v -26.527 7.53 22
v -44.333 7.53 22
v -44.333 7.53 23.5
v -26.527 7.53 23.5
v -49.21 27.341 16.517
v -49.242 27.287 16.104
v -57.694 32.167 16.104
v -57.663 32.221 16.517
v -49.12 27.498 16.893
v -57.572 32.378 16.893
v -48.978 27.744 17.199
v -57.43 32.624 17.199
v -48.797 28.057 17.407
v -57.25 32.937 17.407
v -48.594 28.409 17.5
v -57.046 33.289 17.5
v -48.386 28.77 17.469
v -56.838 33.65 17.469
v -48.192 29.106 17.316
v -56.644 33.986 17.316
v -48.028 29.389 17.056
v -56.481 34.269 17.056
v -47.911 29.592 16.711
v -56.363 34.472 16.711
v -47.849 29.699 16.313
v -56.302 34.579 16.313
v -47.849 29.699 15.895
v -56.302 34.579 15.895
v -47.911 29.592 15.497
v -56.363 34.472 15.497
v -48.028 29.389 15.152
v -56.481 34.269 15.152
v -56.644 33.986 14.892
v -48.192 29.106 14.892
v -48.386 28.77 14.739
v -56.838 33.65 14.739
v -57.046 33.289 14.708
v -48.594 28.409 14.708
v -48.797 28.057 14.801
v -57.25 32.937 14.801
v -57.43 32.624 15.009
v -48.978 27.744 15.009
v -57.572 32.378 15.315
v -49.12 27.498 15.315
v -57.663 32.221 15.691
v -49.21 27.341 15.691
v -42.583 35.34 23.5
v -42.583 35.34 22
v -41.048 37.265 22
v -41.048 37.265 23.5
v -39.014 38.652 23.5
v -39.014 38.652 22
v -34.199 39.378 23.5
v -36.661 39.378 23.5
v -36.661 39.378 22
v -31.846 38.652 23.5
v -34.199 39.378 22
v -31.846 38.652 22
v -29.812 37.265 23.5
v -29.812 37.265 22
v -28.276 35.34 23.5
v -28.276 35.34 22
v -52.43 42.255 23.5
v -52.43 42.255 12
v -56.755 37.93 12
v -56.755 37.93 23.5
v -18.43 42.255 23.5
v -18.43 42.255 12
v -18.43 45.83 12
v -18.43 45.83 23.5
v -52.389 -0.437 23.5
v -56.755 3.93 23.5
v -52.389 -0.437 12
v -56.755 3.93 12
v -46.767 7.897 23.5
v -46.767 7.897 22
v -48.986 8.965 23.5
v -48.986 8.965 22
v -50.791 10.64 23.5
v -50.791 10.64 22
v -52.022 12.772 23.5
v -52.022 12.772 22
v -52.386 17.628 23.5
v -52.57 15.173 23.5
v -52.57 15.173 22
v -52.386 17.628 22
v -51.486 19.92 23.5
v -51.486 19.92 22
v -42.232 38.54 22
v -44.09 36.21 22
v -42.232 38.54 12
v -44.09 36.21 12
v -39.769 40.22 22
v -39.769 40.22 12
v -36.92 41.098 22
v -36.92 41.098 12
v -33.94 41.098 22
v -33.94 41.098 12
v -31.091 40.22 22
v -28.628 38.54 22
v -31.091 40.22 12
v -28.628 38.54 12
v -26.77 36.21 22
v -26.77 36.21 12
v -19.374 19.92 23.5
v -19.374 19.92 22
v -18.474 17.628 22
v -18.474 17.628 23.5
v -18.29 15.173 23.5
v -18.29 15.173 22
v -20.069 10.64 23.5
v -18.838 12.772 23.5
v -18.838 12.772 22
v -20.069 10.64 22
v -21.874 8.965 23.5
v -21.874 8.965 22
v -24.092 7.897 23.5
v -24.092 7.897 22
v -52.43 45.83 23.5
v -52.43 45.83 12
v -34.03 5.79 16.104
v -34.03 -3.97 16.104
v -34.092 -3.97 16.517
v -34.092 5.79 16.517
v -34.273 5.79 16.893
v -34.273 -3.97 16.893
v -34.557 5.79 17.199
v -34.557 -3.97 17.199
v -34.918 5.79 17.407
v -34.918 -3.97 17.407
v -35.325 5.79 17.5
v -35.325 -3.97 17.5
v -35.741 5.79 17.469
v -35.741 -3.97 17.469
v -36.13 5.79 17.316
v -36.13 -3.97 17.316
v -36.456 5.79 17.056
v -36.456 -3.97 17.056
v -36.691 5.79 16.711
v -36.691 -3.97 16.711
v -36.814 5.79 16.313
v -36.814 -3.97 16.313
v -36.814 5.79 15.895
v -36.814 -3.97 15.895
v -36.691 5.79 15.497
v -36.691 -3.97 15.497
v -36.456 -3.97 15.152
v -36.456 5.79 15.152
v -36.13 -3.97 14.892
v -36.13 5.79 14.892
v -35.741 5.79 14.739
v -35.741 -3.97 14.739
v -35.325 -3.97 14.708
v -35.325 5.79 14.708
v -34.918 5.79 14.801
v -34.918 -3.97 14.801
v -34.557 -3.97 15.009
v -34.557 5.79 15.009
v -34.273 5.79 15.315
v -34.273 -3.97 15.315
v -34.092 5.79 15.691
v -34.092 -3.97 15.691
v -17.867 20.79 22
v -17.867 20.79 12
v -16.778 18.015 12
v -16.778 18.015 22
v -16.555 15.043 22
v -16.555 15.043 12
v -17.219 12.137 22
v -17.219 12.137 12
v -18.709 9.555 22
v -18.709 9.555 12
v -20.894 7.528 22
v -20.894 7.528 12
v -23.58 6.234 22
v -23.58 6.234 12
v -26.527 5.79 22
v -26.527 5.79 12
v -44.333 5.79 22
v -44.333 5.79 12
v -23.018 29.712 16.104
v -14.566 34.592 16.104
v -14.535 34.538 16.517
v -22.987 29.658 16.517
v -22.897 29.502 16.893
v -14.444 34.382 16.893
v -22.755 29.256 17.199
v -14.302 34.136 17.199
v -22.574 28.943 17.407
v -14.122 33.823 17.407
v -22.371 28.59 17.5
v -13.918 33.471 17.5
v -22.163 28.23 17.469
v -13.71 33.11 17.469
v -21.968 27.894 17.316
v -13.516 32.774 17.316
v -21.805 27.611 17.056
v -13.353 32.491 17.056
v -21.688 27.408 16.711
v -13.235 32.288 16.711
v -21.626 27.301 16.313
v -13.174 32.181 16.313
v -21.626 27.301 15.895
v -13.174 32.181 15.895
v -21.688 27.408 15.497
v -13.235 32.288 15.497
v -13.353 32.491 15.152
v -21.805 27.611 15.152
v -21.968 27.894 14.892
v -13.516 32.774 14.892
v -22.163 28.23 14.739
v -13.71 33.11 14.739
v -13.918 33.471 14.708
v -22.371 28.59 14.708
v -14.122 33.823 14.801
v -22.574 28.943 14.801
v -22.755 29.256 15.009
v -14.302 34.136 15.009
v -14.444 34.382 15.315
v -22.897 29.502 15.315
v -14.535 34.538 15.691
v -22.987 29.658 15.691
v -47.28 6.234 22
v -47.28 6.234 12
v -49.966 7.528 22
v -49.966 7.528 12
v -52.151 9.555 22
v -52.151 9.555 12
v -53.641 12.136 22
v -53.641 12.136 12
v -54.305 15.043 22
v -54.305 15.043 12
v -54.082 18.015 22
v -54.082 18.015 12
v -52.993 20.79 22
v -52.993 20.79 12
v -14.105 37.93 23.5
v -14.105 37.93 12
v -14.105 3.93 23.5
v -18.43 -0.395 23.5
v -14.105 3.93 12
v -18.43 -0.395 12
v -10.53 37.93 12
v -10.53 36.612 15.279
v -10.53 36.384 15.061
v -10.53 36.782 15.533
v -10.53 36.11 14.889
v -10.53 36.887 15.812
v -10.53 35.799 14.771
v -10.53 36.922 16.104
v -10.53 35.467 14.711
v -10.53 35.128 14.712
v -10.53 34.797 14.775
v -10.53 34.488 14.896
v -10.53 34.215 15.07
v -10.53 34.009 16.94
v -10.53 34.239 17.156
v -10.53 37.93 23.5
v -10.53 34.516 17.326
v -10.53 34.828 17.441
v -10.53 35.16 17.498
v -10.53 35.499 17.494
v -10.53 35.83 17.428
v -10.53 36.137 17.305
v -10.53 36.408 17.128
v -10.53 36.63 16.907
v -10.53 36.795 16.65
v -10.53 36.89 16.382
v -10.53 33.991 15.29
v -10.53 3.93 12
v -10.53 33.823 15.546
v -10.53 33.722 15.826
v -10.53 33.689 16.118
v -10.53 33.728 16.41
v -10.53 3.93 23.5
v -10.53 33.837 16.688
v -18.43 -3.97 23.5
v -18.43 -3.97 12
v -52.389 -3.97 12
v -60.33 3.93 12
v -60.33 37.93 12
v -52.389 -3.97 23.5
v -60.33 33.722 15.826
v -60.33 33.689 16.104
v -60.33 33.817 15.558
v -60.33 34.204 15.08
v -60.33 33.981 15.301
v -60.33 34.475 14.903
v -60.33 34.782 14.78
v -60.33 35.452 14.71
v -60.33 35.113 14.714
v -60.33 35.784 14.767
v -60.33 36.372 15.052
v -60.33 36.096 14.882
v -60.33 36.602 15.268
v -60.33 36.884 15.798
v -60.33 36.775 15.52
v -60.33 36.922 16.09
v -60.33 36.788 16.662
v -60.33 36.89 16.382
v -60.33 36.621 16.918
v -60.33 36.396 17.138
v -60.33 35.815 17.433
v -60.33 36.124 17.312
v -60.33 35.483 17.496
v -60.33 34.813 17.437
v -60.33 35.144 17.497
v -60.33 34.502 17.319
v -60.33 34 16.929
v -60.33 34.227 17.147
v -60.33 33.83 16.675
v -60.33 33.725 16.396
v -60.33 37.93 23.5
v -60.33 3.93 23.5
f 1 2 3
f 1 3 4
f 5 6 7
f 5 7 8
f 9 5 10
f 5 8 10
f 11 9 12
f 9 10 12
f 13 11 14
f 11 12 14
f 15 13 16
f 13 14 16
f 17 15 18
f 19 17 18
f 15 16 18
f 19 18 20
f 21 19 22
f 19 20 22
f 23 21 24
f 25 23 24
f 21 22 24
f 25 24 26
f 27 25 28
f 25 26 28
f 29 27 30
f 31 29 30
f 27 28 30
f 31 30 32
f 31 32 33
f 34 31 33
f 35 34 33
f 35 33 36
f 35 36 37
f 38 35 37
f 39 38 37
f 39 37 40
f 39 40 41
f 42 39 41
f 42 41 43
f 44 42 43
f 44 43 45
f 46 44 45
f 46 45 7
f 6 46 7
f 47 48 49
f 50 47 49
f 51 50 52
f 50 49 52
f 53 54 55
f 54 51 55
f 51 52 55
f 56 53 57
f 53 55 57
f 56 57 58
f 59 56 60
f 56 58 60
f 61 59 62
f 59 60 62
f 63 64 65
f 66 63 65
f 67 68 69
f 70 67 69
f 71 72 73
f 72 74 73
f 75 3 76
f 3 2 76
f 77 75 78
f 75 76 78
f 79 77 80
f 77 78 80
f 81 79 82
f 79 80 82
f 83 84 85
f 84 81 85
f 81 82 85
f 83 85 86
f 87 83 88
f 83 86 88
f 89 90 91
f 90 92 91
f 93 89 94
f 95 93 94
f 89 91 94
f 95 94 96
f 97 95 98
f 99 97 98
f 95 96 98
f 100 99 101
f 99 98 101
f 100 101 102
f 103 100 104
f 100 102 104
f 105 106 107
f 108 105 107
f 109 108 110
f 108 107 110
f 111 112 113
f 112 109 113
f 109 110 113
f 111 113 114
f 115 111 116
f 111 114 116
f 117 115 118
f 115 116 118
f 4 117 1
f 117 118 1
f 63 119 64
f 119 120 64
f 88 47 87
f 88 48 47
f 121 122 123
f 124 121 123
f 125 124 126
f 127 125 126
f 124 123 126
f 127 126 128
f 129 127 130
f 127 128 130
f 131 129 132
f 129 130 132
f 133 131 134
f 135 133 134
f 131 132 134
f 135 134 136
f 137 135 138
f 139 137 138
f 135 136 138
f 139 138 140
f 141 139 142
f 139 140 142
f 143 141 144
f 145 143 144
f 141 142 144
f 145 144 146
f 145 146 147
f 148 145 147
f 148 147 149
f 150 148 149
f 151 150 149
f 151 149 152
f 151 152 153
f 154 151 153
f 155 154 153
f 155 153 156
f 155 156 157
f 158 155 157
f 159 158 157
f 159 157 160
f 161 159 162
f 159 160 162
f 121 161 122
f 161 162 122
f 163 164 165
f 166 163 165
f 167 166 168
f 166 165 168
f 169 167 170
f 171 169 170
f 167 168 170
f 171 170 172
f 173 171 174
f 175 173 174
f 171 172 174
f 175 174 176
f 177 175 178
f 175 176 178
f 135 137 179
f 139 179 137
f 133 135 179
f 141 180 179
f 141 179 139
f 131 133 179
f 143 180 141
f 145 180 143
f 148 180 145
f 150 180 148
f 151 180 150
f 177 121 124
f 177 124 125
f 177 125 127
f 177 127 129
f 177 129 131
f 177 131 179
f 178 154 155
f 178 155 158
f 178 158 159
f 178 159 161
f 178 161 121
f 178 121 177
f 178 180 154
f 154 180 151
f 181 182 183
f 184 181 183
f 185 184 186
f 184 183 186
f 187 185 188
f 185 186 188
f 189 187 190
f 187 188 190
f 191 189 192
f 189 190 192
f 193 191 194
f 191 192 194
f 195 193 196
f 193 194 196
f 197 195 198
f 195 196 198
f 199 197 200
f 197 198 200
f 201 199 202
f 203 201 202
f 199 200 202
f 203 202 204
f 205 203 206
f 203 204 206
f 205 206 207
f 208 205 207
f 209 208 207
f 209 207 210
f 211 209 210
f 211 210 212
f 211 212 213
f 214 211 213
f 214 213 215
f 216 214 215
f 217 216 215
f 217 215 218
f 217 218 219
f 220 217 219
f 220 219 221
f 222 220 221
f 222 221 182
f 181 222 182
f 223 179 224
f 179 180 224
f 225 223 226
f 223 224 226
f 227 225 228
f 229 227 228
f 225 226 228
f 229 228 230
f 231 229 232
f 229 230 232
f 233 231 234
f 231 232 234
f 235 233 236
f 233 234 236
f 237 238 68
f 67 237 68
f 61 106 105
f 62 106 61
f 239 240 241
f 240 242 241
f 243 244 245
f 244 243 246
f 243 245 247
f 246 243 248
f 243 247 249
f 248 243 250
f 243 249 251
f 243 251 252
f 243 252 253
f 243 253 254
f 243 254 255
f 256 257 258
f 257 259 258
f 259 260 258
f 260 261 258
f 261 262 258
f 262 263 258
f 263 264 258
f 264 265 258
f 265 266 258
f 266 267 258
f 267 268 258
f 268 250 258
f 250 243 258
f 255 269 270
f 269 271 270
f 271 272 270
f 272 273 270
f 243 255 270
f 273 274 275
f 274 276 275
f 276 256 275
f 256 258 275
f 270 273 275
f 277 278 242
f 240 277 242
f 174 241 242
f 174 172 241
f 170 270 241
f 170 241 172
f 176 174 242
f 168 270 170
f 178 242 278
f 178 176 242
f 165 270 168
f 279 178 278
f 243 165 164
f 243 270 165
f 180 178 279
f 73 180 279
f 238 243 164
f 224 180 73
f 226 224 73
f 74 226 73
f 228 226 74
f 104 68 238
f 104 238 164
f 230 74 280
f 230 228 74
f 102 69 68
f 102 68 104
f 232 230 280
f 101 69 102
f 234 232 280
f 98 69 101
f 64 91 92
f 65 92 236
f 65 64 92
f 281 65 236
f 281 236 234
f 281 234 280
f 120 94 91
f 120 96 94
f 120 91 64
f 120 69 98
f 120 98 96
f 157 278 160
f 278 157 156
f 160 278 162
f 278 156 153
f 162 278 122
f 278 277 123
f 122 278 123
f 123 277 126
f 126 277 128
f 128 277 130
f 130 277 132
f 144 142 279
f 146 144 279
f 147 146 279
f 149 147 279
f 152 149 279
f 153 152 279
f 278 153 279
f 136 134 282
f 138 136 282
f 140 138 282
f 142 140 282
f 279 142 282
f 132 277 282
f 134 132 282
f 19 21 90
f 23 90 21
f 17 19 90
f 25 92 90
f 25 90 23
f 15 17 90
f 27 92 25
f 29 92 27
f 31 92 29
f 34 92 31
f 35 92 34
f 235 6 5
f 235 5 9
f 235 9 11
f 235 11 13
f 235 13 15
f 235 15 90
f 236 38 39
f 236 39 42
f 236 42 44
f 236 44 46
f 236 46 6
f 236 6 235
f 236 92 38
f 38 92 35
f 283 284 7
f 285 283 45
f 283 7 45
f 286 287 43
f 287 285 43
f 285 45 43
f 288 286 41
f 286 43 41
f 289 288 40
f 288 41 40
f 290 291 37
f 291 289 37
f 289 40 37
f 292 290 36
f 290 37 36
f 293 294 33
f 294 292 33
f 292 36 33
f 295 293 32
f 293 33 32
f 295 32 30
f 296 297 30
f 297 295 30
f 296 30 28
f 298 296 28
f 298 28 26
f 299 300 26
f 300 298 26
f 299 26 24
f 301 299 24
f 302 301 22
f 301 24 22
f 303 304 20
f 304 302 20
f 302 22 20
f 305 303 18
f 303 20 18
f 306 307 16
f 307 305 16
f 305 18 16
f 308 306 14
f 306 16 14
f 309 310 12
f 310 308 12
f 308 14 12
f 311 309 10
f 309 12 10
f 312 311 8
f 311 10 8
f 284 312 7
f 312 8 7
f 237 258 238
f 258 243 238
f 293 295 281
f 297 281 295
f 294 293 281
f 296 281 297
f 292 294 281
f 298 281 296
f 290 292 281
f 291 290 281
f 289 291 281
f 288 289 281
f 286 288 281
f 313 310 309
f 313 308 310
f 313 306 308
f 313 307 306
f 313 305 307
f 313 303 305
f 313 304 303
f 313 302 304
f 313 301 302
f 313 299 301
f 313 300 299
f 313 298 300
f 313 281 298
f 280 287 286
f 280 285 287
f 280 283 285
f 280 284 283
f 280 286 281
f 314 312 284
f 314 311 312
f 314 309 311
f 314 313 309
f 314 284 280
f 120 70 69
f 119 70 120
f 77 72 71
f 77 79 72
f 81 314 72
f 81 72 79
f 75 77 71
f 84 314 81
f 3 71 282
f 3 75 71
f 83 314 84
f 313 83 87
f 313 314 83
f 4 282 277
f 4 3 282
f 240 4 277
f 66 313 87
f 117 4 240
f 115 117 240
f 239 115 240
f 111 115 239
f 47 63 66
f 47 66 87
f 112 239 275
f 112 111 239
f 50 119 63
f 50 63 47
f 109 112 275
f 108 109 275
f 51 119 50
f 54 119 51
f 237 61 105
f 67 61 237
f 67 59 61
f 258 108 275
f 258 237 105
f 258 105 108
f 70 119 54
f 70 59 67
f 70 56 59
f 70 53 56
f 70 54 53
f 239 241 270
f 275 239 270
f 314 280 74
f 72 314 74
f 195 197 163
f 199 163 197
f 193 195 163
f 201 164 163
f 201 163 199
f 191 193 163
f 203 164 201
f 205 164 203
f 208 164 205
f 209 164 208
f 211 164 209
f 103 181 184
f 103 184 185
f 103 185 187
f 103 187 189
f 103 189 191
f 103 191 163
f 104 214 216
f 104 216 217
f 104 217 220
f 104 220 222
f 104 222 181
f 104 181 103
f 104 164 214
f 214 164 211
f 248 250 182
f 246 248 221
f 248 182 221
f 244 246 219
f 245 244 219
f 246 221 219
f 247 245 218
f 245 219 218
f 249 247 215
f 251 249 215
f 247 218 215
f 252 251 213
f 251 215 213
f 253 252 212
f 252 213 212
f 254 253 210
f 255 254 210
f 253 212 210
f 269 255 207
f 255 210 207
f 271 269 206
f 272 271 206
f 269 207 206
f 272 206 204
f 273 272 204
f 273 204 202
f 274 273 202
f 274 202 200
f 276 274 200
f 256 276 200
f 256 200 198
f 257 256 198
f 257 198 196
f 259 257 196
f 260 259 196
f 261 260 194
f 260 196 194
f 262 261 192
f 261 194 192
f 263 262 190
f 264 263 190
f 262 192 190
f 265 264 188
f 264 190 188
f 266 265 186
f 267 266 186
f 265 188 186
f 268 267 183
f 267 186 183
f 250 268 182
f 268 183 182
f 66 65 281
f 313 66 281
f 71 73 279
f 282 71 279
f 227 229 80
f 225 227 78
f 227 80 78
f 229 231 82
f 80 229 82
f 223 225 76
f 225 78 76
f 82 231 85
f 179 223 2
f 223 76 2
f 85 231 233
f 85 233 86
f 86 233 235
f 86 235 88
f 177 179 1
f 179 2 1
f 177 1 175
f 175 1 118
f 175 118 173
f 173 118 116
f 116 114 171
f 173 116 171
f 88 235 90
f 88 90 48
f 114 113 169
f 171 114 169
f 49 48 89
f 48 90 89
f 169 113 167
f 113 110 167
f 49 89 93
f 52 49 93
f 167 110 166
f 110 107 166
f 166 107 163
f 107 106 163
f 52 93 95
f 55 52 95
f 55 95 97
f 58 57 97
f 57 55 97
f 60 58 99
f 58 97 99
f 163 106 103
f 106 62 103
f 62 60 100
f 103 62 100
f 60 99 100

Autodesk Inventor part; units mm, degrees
ref_plane "YZ Plane" through (0, 0, 0) normal (1, 0, 0) x (0, 1, 0)
ref_plane "XZ Plane" through (0, 0, 0) normal (0, 1, 0) x (-1, 0, 0)
ref_plane "Work Plane1" through (-56.3599, 0, 22) normal (0, 0, -1) x (-1, 0, 0)
sketch "Sketch1" plane through (-56.3599, 0, 22) normal (0, 0, -1) x (-1, 0, 0)
  line L0 (-4.0299, -0.3538) -> (-2.2322, 1.4439) construction
  arc A0 (-1.4439, 2.2322) -> (-2.2322, 1.4439) centre (-0.9299, 0.9299) ccw construction
  line L1 (-1.4439, 2.2322) -> (0.3538, 4.0299) construction
  line L2 (-37.8299, 42.8299) -> (-37.8299, 37.8299) construction
  line L3 (-37.8299, 37.8299) -> (-42.9208, 37.8299) construction
  line L4 (-37.8299, 42.2137) -> (-37.8299, 45.8299) construction
  line L5 (-37.8299, 45.8299) -> (-4.0299, 45.8299) construction
  line L6 (-4.0299, 45.8299) -> (-4.0299, 42.2137) construction
  line L7 (-4.0299, 4.0299) -> (0.3538, 4.0299) projected
  circle A1 centre (-20.9299, 20.9299) radius 17.5 projected
  line L8 (-20.9299, 58.9723) -> (17.1124, 20.9299) construction
  line L9 (17.1124, 20.9299) -> (-20.9299, -17.1124) construction
  line L10 (-20.9299, -17.1124) -> (-58.9723, 20.9299) construction
  line L11 (-58.9723, 20.9299) -> (-20.9299, 58.9723) construction
  line L12 (-20.9299, 58.9723) -> (-20.9299, -17.1124) construction
  line L13 (17.1124, 20.9299) -> (-58.9723, 20.9299) construction
  line L14 (-20.9299, 58.9723) -> (32.8701, 58.9723) construction
  line L15 (-43.4299, 43.4299) -> (1.5701, 43.4299) construction
  line L16 (1.5701, 43.4299) -> (1.5701, -1.5701) construction
  line L17 (1.5701, -1.5701) -> (-43.4299, -1.5701) construction
  line L18 (-43.4299, -1.5701) -> (-43.4299, 43.4299) construction
  line L19 (-43.4299, 43.4299) -> (1.5701, -1.5701) construction
  line L20 (1.5701, 43.4299) -> (-43.4299, -1.5701) construction
  line L21 (-43.4299, 5.3876) -> (-43.4299, 36.4723)
  line L22 (-43.4299, 36.4723) -> (-36.4723, 43.4299)
  line L23 (-36.4723, 43.4299) -> (-5.3876, 43.4299)
  line L24 (-5.3876, 43.4299) -> (1.5701, 36.4723)
  line L25 (1.5701, 36.4723) -> (1.5701, 5.3876)
  line L26 (1.5701, 5.3876) -> (-5.3876, -1.5701)
  line L27 (-5.3876, -1.5701) -> (-36.4723, -1.5701)
  line L28 (-36.4723, -1.5701) -> (-43.4299, 5.3876)
  line L29 (-4.0299, 42.2137) -> (-37.8299, 42.2137) projected
  line L30 (-4.0299, -0.3538) -> (-4.0299, 4.0299) projected
  circle A2 centre (-20.9299, 20.9299) radius 1.5
  line L31 (-10.9299, 10.9299) -> (-30.9299, 10.9299) construction
  line L32 (-30.9299, 10.9299) -> (-30.9299, 30.9299) construction
  line L33 (-30.9299, 30.9299) -> (-10.9299, 30.9299) construction
  line L34 (-10.9299, 30.9299) -> (-10.9299, 10.9299) construction
  line L35 (-10.9299, 10.9299) -> (-30.9299, 30.9299) construction
  line L36 (-30.9299, 10.9299) -> (-10.9299, 30.9299) construction
  circle A3 centre (-30.9299, 30.9299) radius 1.4
  circle A4 centre (-30.9299, 10.9299) radius 1.4
  circle A5 centre (-10.9299, 10.9299) radius 1.4
  line L37 (-45.8299, 37.8299) -> (-42.0723, 37.8299) construction
  line L38 (-42.1723, 37.7299) -> (-45.8299, 37.7299)
  line L39 (-45.8299, 37.7299) -> (-45.8299, 4.1299)
  line L40 (-45.8299, 4.1299) -> (-42.1723, 4.1299)
  line L41 (-42.1723, 4.1299) -> (-42.1723, 37.7299)
  line L42 (-45.8299, 4.0299) -> (-42.0723, 4.0299) construction
  line L43 (-45.8299, 37.8299) -> (-42.0723, 37.8299) projected
  line L44 (-37.7299, 45.8299) -> (-4.1299, 45.8299)
  line L45 (-4.1299, 45.8299) -> (-4.1299, 42.1723)
  line L46 (-4.1299, 42.1723) -> (-37.7299, 42.1723)
  line L47 (-37.7299, 42.1723) -> (-37.7299, 45.8299)
  line L48 (0.4701, 37.8299) -> (0.4701, 4.0299) construction
  line L49 (0.4701, 4.0299) -> (3.9701, 4.0299) construction
  line L50 (3.9701, 37.8299) -> (3.9701, 4.0299) construction
  line L51 (0.4701, 37.8299) -> (3.9701, 37.8299) construction
  line L52 (-45.8299, -3.9701) -> (-4.0299, -3.9701) construction
  line L53 (0.3124, 37.7299) -> (3.9701, 37.7299)
  line L54 (3.9701, 37.7299) -> (3.9701, 4.1299)
  line L55 (3.9701, 4.1299) -> (0.3124, 4.1299)
  line L56 (0.3124, 4.1299) -> (0.3124, 37.7299)
  line L57 (-4.1713, -0.3538) -> (-37.7299, -0.3538)
  line L58 (-37.7299, -0.3538) -> (-37.7299, -3.9701)
  line L59 (-37.7299, -3.9701) -> (-4.1713, -3.9701)
  line L60 (-4.1713, -3.9701) -> (-4.1713, -0.3538)
  point P0 (-37.8299, 4.0299)
  dimension "d18" = 53.8
  dimension "d19" = 45
  dimension "d20" = 53.8
  dimension "d21" = 45
  dimension "d22" = 45
  dimension "d30" = 20
  dimension "d31" = 20
  dimension "d32" = 2.8
  dimension "d33" = 2.8
  dimension "d34" = 2.8
  dimension "d35" = 3
  dimension "d36" = 0.1
  dimension "d37" = 0.1
  dimension "d38" = 0.1
  dimension "d39" = 0.1
extrude "Extrusion1" add sketch "Sketch1" along normal blind 10 contours L30 L26 L57 L28 L41 L22 L46 L24 L56 L7 | L7 L26 L30 | L56 L24 L25 L26 | L26 L25 L24 L53 L54 L55 | L60 L59 L58 L57 L28 L27 L26 | L26 L27 L28 L57 | L46 L22 L29 L24 | L24 L29 L45 | L40 L39 L38 L22 L21 L28 | L28 L21 L22 L41 | L29 L22 L23 L24 | L24 L23 L22 L29 L47 L44 L45 | L47 L29 L22 | A1 | A2 | A3 | A4 | A5
sketch "Skizze4" plane through (-56.3599, 0, 12) normal (0, 0, -1) x (-1, 0, 0)
  line L0 (-37.7299, 42.1723) -> (-42.1723, 37.7299) projected
  line L1 (-42.1723, 37.7299) -> (-45.8299, 37.7299) projected
  line L2 (-45.8299, 37.7299) -> (-45.8299, 4.1299) construction
  line L3 (-45.8299, 4.1299) -> (-42.1723, 4.1299) projected
  line L4 (-42.1723, 4.1299) -> (-37.6885, -0.3538) projected
  line L5 (-37.6885, -0.3538) -> (-37.7299, -0.3538) projected
  line L6 (-37.7299, -0.3538) -> (-37.7299, -3.9701) projected
  line L7 (-37.7299, -3.9701) -> (-4.1713, -3.9701) construction
  line L8 (-4.1713, -3.9701) -> (-4.1713, -0.3538) projected
  line L9 (-4.1713, -0.3538) -> (0.3124, 4.1299) projected
  line L10 (0.3124, 4.1299) -> (3.9701, 4.1299) projected
  line L11 (3.9701, 4.1299) -> (3.9701, 37.7299) construction
  line L12 (3.9701, 37.7299) -> (0.3124, 37.7299) projected
  line L13 (0.3124, 37.7299) -> (-4.1299, 42.1723) projected
  line L14 (-4.1299, 42.1723) -> (-4.1299, 45.8299) projected
  line L15 (-4.1299, 45.8299) -> (-37.7299, 45.8299) construction
  line L16 (-37.7299, 45.8299) -> (-37.7299, 42.1723) projected
  line L17 (-37.9299, 46.0299) -> (-3.9299, 46.0299) construction
  line L18 (-3.9299, 46.0299) -> (-3.9299, 42.2551)
  line L19 (-3.9299, 42.2551) -> (0.3953, 37.9299)
  line L20 (0.3953, 37.9299) -> (4.1701, 37.9299)
  line L21 (4.1701, 37.9299) -> (4.1701, 3.9299) construction
  line L22 (4.1701, 3.9299) -> (0.3953, 3.9299)
  line L23 (0.3953, 3.9299) -> (-3.9713, -0.4367)
  line L24 (-3.9713, -0.4367) -> (-3.9713, -4.1701)
  line L25 (-3.9713, -4.1701) -> (-37.9299, -4.1701) construction
  line L26 (-37.9299, -4.1701) -> (-37.9299, -0.3953)
  line L27 (-37.9299, -0.3953) -> (-42.2551, 3.9299)
  line L28 (-42.2551, 3.9299) -> (-46.0299, 3.9299)
  line L29 (-46.0299, 3.9299) -> (-46.0299, 37.9299) construction
  line L30 (-46.0299, 37.9299) -> (-42.2551, 37.9299)
  line L31 (-42.2551, 37.9299) -> (-37.9299, 42.2551)
  line L32 (-37.9299, 42.2551) -> (-37.9299, 46.0299)
  line L33 (-45.8299, 37.7299) -> (-45.8299, 37.9299)
  line L34 (-4.1299, 45.8299) -> (-37.7299, 45.8299) projected
  line L35 (-37.7299, 45.8299) -> (-37.9299, 45.8299)
  line L36 (-4.1299, 45.8299) -> (-3.9299, 45.8299)
  line L37 (3.9701, 37.7299) -> (3.9701, 37.9299)
  line L38 (3.9701, 4.1299) -> (3.9701, 37.7299) projected
  line L39 (3.9701, 4.1299) -> (3.9701, 3.9299)
  line L40 (-4.1713, -3.9701) -> (-3.9713, -3.9701)
  line L41 (-37.7299, -3.9701) -> (-37.9299, -3.9701)
  line L42 (-45.8299, 4.1299) -> (-45.8299, 3.9299)
  point P0 (-56.3599, 0)
  dimension "d40" = 0.2
extrude "IM_offset" add sketch "Skizze4" against normal up to surface (10 mm away)
ref_plane "Arbeitsebene5" through (-35.4299, 3.9299, 22) normal (-1, 0, 0) x (0, 0, 1)
ref_plane "Arbeitsebene6" through (-18.4299, 20.9299, 22) normal (0, 1, 0) x (-1, 0, 0)
sketch "Sketch33" plane through (-56.3599, 0, 12) normal (0, 0, -1) x (-1, 0, 0)
  circle A0 centre (-20.9299, 20.9299) radius 15.24 construction
  circle A1 centre (-20.9299, 20.9299) radius 15.14 construction
  line L0 (-12.0272, 5.7899) -> (-29.8327, 5.7899)
  line L1 (-38.4929, 20.7899) -> (-29.5902, 36.2099)
  line L2 (-12.2697, 36.2099) -> (-3.3669, 20.7899)
  line L3 (-42.2551, 3.9299) -> (-45.8299, 3.9299) projected
  arc A2 (-12.0272, 5.7899) -> (-3.3669, 20.7899) centre (-12.0272, 15.7899) ccw
  arc A3 (-38.4929, 20.7899) -> (-29.8327, 5.7899) centre (-29.8327, 15.7899) ccw
  arc A4 (-12.2697, 36.2099) -> (-29.5902, 36.2099) centre (-20.9299, 31.2099) ccw
  point P0 (-56.3599, 0)
  point P1 (5.2933, 5.7899)
  point P2 (-47.1532, 5.7899)
  point P3 (-20.9299, 51.2099)
  dimension "d184" = 0.1
  dimension "d185" = 0
  dimension "d186" = 10
extrude "Extrusion27" cut sketch "Sketch33" against normal blind 10
sketch "Sketch34" plane through (-56.3599, 0, 22) normal (0, 0, 1) x (1, 0, 0)
  arc A0 (29.8327, 5.7899) -> (38.4929, 20.7899) centre (29.8327, 15.7899) ccw projected
  line L0 (29.8327, 5.7899) -> (12.0272, 5.7899) projected
  arc A1 (3.3669, 20.7899) -> (12.0272, 5.7899) centre (12.0272, 15.7899) ccw projected
  line L1 (3.3669, 20.7899) -> (12.2697, 36.2099) projected
  arc A2 (29.5902, 36.2099) -> (12.2697, 36.2099) centre (20.9299, 31.2099) ccw projected
  line L2 (29.5902, 36.2099) -> (38.4929, 20.7899) projected
  line L3 (3.9713, -3.9701) -> (37.9299, -3.9701) projected
  line L4 (37.9299, -3.9701) -> (37.9299, -0.3953) projected
  line L5 (37.9299, -0.3953) -> (42.2551, 3.9299) projected
  line L6 (42.2551, 3.9299) -> (45.8299, 3.9299) projected
  line L7 (45.8299, 3.9299) -> (45.8299, 37.9299) projected
  line L8 (45.8299, 37.9299) -> (42.2551, 37.9299) projected
  line L9 (42.2551, 37.9299) -> (37.9299, 42.2551) projected
  line L10 (37.9299, 42.2551) -> (37.9299, 45.8299) projected
  line L11 (37.9299, 45.8299) -> (3.9299, 45.8299) projected
  line L12 (3.9299, 45.8299) -> (3.9299, 42.2551) projected
  line L13 (3.9299, 42.2551) -> (-0.3953, 37.9299) projected
  line L14 (-0.3953, 37.9299) -> (-3.9701, 37.9299) projected
  line L15 (-3.9701, 37.9299) -> (-3.9701, 3.9299) projected
  line L16 (-3.9701, 3.9299) -> (-0.3953, 3.9299) projected
  line L17 (-0.3953, 3.9299) -> (3.9713, -0.4367) projected
  line L18 (3.9713, -0.4367) -> (3.9713, -3.9701) projected
  circle A3 centre (20.9299, 20.9299) radius 13.5001 construction
  circle A4 centre (20.9299, 20.9299) radius 13.4001
  line L19 (12.0272, 7.5298) -> (29.8327, 7.5298)
  arc A5 (29.8327, 7.5298) -> (36.9861, 19.92) centre (29.8327, 15.7899) ccw
  line L20 (36.9861, 19.92) -> (28.0834, 35.34)
  arc A6 (28.0834, 35.34) -> (13.7765, 35.34) centre (20.9299, 31.2099) ccw
  line L21 (13.7765, 35.34) -> (4.8737, 19.92)
  arc A7 (4.8737, 19.92) -> (12.0272, 7.5298) centre (12.0272, 15.7899) ccw
  point P0 (56.3599, 0)
  dimension "d189" = 0.1
extrude "Extrusion28" add sketch "Sketch34" along normal blind 1.5 contours L0 A1 L1 A2 L2 A0 | L18 L17 L16 L15 L14 L13 L12 L11 L10 L9 L8 L7 L6 L5 L4 L3
sketch "Sketch35" plane through (-52.3885, -3.9701, 12) normal (0, -1, 0) x (1, 0, 0)
  line L0 (0, 0) -> (0, 11.5) projected
  line L1 (0, 0) -> (33.9586, 0) projected
  line L2 (33.9586, 0) -> (33.9586, 11.5) projected
  line L3 (0, 11.5) -> (33.9586, 11.5) projected
  circle A0 centre (16.9586, 4.104) radius 1.4
  point P0 (52.3885, -12)
  dimension "d192" = 2.8
extrude "Extrusion29" cut sketch "Sketch35" along normal mid plane 30 contours A0
pattern_circular "Circular Pattern2" count 3 over 360 about axis through (-35.4299, 20.9299, 22) along (0, 0, 1) of "Extrusion29"
properties part number "20_Cube_Insert_Filter_25mm"
